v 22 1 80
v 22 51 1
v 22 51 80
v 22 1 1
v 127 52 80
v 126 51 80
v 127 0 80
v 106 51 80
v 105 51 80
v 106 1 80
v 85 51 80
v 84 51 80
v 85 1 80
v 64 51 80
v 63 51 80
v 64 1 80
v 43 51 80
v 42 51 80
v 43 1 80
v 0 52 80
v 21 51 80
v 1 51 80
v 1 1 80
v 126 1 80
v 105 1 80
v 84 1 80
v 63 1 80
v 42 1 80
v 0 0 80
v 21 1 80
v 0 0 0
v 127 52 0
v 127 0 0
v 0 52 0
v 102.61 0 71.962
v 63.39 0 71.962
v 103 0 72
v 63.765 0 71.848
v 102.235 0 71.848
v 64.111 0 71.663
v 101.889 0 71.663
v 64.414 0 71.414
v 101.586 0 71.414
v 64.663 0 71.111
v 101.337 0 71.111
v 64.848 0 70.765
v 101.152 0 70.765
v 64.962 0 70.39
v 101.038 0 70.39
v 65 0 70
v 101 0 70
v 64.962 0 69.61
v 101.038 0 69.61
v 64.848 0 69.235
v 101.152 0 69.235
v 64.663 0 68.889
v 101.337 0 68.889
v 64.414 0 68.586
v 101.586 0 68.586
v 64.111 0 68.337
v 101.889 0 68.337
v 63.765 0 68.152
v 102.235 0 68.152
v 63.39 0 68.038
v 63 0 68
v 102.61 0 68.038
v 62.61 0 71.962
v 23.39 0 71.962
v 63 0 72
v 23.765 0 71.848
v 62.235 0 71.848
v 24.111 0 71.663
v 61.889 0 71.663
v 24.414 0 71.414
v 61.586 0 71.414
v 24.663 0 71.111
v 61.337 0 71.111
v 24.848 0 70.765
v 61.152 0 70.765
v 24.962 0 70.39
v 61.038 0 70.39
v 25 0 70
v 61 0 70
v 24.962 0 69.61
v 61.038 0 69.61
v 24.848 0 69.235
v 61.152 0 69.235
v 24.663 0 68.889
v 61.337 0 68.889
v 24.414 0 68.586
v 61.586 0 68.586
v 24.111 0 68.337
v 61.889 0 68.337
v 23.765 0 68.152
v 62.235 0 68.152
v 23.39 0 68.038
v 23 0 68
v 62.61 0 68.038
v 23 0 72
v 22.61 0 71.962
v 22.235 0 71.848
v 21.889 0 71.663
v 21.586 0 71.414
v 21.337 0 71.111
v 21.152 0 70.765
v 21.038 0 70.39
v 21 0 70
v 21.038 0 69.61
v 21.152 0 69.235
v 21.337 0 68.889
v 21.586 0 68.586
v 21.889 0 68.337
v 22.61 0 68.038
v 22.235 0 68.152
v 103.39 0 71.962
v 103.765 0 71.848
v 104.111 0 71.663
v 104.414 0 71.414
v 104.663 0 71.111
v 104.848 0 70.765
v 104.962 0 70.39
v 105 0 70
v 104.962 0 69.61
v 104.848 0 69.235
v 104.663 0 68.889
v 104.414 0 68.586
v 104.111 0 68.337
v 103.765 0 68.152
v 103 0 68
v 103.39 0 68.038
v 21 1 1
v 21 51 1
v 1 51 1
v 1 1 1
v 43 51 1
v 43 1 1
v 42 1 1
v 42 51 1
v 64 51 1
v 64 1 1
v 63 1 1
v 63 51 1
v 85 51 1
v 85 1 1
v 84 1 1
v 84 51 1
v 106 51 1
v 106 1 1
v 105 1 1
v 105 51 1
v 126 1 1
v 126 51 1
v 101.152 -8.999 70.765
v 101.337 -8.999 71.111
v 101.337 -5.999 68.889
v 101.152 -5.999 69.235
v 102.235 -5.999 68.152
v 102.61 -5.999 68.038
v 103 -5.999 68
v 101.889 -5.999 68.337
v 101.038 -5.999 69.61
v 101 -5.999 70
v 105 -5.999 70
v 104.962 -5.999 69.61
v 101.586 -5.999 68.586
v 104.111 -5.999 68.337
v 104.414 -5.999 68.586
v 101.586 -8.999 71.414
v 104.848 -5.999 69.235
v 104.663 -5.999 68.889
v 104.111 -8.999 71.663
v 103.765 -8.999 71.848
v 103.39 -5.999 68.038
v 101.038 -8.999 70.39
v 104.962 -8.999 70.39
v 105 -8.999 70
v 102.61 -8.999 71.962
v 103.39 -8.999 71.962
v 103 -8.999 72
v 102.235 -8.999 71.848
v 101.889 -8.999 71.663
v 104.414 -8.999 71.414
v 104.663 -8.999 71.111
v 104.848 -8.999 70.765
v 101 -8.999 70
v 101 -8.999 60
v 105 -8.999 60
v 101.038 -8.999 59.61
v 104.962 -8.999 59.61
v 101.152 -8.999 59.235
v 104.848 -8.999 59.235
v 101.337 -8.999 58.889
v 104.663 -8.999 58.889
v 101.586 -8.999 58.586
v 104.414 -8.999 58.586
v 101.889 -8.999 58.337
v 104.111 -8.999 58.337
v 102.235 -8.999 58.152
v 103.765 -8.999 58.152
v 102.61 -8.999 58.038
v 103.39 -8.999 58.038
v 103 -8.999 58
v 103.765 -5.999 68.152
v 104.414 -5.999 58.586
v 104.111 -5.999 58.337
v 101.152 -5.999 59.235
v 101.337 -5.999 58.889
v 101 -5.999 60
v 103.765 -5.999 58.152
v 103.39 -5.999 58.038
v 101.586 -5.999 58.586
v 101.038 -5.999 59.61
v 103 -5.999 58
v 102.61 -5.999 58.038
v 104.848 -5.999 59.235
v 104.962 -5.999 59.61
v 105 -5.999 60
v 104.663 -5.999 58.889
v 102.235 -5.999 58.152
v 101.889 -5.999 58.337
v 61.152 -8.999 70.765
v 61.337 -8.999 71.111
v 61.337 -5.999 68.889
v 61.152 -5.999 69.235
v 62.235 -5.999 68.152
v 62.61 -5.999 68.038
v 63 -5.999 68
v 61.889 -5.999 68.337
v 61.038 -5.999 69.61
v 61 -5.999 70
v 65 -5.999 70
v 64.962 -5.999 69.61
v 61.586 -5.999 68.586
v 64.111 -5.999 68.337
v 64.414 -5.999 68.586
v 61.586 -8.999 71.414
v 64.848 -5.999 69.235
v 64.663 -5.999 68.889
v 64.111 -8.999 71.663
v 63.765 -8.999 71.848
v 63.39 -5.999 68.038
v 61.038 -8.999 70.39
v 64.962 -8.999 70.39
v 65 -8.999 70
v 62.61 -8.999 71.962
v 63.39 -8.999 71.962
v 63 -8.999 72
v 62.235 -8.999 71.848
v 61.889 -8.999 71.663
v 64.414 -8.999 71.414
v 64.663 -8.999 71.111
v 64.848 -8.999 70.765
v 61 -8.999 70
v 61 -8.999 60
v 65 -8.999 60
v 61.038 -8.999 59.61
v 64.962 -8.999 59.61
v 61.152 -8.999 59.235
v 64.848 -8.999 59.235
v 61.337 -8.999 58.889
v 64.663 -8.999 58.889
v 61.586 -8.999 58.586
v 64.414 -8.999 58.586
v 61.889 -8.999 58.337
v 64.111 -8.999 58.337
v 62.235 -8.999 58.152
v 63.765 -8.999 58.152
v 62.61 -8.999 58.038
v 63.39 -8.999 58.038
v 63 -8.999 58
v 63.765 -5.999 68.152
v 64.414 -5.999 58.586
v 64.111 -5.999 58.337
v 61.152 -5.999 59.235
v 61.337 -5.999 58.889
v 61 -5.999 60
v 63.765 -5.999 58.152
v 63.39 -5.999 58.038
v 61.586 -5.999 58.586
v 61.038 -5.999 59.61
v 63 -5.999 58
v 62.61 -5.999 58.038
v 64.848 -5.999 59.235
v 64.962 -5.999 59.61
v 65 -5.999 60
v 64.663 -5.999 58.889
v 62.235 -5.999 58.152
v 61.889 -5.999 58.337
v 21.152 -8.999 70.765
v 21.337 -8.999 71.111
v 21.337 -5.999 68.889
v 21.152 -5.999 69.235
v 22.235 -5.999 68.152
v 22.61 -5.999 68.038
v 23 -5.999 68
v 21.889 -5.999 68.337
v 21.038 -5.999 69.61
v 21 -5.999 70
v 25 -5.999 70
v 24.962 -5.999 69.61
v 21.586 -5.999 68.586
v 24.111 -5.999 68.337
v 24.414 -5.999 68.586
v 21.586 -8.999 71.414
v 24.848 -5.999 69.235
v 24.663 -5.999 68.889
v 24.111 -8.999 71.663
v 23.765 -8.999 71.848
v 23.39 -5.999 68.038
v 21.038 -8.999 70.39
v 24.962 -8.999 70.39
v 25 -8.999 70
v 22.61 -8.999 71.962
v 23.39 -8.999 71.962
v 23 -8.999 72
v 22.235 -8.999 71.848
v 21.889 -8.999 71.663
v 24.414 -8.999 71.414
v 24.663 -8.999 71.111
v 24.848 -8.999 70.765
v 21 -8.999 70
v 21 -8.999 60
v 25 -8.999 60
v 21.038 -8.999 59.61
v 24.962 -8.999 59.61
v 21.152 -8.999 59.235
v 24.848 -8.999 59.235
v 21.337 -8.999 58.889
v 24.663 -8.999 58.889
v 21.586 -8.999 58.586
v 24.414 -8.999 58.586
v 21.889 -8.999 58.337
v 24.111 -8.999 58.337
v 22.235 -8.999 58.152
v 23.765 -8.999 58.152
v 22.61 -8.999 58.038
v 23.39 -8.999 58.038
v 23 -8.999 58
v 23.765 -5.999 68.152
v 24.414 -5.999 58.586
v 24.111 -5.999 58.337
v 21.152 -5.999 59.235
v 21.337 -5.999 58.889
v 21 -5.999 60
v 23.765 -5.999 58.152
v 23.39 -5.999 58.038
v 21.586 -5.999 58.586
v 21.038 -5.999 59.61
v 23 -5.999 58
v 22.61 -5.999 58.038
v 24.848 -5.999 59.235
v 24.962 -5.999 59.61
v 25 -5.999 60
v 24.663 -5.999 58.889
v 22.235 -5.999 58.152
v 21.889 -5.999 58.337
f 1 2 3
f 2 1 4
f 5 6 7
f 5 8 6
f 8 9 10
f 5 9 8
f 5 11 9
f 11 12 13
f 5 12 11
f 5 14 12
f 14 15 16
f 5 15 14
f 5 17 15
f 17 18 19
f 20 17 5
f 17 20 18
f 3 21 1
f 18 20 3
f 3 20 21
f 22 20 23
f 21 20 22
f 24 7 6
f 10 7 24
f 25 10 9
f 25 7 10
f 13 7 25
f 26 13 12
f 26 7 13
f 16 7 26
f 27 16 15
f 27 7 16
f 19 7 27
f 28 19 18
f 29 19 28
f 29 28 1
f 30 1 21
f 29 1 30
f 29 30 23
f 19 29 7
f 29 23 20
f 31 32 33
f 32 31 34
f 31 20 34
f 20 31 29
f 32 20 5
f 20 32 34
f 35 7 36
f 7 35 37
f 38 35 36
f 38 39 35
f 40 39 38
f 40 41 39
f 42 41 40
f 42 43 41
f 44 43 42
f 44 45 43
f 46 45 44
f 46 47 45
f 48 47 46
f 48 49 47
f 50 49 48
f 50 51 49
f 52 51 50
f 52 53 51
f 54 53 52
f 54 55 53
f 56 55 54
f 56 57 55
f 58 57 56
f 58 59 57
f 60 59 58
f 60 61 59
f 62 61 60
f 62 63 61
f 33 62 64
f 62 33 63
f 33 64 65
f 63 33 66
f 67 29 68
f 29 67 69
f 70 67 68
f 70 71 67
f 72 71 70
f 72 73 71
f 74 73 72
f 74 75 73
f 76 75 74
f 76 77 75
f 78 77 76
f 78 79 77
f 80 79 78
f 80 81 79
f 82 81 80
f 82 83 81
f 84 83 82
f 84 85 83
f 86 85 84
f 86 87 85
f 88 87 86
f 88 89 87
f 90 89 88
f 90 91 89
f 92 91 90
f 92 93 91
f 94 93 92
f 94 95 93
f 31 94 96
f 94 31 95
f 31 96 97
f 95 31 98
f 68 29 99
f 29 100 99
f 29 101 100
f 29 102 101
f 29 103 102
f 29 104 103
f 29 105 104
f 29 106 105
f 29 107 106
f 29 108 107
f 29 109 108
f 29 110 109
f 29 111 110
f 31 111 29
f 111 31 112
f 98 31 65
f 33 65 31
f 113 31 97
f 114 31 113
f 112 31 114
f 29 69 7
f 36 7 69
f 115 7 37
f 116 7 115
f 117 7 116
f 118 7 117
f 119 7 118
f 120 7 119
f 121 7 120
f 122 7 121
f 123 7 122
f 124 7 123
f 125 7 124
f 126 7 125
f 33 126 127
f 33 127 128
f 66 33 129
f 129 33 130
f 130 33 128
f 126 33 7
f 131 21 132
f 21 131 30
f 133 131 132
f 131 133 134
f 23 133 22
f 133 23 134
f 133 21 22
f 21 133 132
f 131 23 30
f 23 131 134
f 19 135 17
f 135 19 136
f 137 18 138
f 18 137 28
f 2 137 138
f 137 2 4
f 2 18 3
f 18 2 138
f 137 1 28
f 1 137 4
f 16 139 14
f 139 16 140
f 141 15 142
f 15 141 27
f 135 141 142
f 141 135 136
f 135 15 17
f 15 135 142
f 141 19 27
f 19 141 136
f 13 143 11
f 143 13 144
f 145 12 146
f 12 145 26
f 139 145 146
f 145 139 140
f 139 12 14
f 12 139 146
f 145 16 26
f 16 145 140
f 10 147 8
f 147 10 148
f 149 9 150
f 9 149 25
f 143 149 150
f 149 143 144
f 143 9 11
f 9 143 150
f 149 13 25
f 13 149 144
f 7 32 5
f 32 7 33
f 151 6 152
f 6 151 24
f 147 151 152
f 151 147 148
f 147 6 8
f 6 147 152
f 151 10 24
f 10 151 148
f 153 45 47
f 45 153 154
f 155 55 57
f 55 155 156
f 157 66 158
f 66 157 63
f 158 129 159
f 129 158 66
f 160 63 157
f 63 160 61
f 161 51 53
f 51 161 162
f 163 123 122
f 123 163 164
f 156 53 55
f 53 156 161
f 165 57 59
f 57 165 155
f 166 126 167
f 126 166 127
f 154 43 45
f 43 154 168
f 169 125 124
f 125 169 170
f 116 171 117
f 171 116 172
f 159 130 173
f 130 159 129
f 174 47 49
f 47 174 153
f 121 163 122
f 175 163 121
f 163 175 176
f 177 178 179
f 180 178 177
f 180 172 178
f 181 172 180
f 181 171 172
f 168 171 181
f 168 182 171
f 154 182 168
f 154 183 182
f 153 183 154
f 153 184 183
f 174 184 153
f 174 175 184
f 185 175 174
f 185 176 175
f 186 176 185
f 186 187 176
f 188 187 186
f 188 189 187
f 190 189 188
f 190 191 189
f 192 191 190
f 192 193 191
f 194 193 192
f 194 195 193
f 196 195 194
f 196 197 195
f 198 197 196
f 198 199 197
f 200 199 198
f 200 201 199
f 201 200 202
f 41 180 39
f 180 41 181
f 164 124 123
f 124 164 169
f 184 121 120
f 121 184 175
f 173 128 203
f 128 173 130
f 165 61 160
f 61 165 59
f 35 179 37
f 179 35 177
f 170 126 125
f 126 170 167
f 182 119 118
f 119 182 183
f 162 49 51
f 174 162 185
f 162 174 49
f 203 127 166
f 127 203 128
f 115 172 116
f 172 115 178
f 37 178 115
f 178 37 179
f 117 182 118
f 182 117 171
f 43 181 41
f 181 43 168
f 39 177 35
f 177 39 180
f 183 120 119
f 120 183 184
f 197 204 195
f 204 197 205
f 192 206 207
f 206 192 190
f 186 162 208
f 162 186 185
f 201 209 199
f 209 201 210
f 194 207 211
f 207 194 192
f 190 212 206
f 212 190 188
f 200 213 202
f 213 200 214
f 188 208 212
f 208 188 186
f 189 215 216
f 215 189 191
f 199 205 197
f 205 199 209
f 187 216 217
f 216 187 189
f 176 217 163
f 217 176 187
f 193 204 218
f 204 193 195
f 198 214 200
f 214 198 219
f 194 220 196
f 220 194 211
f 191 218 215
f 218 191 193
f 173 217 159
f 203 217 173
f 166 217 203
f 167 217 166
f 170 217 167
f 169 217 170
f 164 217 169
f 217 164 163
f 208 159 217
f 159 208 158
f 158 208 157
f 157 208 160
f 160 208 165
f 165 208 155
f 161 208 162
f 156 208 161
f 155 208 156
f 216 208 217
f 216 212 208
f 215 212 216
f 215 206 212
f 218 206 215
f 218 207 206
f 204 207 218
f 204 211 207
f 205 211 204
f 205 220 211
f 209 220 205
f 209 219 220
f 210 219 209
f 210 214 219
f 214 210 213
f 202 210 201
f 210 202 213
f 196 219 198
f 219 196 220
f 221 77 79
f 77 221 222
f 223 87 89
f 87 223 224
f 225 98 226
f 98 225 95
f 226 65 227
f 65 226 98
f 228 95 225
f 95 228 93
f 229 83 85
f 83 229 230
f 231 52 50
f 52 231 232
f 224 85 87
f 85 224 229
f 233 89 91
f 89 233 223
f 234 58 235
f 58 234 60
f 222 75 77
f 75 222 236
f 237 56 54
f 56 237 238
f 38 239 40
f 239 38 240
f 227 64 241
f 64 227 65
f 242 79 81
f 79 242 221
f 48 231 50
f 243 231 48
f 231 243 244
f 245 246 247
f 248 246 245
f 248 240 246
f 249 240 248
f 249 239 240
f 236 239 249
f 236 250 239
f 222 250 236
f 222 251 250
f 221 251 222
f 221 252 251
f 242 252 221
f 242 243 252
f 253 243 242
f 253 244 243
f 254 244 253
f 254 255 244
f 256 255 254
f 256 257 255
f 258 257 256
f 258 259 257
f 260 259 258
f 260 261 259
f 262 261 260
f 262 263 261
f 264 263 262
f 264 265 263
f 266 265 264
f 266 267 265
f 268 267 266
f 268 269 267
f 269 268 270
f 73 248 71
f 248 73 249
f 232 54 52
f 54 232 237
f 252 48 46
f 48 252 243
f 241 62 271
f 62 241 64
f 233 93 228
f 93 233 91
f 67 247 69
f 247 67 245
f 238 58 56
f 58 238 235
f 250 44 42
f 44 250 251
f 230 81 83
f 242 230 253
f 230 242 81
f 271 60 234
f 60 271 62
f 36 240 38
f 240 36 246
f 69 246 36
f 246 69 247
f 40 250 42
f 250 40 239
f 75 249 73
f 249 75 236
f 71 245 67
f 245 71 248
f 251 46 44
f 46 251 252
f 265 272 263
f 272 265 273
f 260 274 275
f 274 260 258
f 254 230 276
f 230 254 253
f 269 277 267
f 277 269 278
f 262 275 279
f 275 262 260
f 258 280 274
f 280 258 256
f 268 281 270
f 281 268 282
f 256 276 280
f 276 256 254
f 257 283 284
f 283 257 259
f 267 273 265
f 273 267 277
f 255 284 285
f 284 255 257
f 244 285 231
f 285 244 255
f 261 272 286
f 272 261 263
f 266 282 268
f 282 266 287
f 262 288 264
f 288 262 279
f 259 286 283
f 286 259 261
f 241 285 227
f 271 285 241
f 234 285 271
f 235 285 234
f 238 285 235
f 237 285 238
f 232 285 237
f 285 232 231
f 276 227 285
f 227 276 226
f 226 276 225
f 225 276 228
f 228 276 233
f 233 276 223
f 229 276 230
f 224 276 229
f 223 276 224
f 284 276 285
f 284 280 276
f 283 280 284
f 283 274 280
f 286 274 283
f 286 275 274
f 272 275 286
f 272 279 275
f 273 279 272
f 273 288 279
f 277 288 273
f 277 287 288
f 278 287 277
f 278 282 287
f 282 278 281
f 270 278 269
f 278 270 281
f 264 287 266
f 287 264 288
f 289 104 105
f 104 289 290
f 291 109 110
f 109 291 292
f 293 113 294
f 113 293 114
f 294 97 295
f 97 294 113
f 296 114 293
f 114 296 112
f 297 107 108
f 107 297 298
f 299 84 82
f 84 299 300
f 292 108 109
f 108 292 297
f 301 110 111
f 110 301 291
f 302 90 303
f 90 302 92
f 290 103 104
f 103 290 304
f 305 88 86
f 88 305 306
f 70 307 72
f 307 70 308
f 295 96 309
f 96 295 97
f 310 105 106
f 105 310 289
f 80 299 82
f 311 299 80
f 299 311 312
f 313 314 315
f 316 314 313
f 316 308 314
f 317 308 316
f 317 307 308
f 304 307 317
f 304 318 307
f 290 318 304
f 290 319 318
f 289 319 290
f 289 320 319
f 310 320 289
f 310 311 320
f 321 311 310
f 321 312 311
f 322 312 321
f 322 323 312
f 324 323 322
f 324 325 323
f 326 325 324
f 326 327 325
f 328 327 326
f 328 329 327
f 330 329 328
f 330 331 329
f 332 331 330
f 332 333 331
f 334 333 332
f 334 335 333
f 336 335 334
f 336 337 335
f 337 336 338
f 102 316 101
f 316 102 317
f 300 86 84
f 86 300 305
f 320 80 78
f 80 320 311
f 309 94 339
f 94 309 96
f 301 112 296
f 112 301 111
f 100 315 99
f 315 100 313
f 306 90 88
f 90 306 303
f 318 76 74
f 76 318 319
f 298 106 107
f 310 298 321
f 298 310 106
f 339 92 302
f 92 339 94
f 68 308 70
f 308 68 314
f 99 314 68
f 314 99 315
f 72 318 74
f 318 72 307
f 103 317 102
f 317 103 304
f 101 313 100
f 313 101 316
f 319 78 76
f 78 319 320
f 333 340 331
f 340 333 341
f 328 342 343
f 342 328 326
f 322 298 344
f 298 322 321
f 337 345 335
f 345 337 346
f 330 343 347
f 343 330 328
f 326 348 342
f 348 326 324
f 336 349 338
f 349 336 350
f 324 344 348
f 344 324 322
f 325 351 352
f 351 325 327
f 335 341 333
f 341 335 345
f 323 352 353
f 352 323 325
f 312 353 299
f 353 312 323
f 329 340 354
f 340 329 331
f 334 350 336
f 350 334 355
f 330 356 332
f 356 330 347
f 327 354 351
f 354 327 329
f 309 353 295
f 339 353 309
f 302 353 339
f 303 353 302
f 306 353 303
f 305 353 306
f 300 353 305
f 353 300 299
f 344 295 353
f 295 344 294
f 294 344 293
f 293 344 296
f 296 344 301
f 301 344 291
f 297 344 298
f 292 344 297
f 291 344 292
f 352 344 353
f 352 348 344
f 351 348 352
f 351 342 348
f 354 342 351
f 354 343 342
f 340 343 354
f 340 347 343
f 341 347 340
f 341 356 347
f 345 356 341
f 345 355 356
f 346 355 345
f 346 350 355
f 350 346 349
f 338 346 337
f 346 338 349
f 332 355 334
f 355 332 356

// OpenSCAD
// file: gancho.scad
module ganchos(n=1){    
    for (i=[0:1:n-1]){
        translate([0,40*i,,0]) rotate([0, 90, 0]) translate([0, 0, -9]) {
            cylinder(d = 4, h=9, $fn = 32);
            hull(){
                cylinder(d = 4, h=3, $fn = 32);
                translate([10, 0, 0]) cylinder(d = 4, h=3, $fn = 32);
            } 
        }
    }   
}

// ganchos(3);
// main file
include <gancho.scad>

for (i=[0:5]) {
    translate([i*21,0,0]) difference() {
        cube([22,52, 80], center = false);
        translate([1,1,1]) cube([20,50, 80], center = false);
    }
}

translate([40 * 2 + (6*21 - 40*2)/2, 0.001, 70]) rotate([0,0,90]) ganchos(3);
